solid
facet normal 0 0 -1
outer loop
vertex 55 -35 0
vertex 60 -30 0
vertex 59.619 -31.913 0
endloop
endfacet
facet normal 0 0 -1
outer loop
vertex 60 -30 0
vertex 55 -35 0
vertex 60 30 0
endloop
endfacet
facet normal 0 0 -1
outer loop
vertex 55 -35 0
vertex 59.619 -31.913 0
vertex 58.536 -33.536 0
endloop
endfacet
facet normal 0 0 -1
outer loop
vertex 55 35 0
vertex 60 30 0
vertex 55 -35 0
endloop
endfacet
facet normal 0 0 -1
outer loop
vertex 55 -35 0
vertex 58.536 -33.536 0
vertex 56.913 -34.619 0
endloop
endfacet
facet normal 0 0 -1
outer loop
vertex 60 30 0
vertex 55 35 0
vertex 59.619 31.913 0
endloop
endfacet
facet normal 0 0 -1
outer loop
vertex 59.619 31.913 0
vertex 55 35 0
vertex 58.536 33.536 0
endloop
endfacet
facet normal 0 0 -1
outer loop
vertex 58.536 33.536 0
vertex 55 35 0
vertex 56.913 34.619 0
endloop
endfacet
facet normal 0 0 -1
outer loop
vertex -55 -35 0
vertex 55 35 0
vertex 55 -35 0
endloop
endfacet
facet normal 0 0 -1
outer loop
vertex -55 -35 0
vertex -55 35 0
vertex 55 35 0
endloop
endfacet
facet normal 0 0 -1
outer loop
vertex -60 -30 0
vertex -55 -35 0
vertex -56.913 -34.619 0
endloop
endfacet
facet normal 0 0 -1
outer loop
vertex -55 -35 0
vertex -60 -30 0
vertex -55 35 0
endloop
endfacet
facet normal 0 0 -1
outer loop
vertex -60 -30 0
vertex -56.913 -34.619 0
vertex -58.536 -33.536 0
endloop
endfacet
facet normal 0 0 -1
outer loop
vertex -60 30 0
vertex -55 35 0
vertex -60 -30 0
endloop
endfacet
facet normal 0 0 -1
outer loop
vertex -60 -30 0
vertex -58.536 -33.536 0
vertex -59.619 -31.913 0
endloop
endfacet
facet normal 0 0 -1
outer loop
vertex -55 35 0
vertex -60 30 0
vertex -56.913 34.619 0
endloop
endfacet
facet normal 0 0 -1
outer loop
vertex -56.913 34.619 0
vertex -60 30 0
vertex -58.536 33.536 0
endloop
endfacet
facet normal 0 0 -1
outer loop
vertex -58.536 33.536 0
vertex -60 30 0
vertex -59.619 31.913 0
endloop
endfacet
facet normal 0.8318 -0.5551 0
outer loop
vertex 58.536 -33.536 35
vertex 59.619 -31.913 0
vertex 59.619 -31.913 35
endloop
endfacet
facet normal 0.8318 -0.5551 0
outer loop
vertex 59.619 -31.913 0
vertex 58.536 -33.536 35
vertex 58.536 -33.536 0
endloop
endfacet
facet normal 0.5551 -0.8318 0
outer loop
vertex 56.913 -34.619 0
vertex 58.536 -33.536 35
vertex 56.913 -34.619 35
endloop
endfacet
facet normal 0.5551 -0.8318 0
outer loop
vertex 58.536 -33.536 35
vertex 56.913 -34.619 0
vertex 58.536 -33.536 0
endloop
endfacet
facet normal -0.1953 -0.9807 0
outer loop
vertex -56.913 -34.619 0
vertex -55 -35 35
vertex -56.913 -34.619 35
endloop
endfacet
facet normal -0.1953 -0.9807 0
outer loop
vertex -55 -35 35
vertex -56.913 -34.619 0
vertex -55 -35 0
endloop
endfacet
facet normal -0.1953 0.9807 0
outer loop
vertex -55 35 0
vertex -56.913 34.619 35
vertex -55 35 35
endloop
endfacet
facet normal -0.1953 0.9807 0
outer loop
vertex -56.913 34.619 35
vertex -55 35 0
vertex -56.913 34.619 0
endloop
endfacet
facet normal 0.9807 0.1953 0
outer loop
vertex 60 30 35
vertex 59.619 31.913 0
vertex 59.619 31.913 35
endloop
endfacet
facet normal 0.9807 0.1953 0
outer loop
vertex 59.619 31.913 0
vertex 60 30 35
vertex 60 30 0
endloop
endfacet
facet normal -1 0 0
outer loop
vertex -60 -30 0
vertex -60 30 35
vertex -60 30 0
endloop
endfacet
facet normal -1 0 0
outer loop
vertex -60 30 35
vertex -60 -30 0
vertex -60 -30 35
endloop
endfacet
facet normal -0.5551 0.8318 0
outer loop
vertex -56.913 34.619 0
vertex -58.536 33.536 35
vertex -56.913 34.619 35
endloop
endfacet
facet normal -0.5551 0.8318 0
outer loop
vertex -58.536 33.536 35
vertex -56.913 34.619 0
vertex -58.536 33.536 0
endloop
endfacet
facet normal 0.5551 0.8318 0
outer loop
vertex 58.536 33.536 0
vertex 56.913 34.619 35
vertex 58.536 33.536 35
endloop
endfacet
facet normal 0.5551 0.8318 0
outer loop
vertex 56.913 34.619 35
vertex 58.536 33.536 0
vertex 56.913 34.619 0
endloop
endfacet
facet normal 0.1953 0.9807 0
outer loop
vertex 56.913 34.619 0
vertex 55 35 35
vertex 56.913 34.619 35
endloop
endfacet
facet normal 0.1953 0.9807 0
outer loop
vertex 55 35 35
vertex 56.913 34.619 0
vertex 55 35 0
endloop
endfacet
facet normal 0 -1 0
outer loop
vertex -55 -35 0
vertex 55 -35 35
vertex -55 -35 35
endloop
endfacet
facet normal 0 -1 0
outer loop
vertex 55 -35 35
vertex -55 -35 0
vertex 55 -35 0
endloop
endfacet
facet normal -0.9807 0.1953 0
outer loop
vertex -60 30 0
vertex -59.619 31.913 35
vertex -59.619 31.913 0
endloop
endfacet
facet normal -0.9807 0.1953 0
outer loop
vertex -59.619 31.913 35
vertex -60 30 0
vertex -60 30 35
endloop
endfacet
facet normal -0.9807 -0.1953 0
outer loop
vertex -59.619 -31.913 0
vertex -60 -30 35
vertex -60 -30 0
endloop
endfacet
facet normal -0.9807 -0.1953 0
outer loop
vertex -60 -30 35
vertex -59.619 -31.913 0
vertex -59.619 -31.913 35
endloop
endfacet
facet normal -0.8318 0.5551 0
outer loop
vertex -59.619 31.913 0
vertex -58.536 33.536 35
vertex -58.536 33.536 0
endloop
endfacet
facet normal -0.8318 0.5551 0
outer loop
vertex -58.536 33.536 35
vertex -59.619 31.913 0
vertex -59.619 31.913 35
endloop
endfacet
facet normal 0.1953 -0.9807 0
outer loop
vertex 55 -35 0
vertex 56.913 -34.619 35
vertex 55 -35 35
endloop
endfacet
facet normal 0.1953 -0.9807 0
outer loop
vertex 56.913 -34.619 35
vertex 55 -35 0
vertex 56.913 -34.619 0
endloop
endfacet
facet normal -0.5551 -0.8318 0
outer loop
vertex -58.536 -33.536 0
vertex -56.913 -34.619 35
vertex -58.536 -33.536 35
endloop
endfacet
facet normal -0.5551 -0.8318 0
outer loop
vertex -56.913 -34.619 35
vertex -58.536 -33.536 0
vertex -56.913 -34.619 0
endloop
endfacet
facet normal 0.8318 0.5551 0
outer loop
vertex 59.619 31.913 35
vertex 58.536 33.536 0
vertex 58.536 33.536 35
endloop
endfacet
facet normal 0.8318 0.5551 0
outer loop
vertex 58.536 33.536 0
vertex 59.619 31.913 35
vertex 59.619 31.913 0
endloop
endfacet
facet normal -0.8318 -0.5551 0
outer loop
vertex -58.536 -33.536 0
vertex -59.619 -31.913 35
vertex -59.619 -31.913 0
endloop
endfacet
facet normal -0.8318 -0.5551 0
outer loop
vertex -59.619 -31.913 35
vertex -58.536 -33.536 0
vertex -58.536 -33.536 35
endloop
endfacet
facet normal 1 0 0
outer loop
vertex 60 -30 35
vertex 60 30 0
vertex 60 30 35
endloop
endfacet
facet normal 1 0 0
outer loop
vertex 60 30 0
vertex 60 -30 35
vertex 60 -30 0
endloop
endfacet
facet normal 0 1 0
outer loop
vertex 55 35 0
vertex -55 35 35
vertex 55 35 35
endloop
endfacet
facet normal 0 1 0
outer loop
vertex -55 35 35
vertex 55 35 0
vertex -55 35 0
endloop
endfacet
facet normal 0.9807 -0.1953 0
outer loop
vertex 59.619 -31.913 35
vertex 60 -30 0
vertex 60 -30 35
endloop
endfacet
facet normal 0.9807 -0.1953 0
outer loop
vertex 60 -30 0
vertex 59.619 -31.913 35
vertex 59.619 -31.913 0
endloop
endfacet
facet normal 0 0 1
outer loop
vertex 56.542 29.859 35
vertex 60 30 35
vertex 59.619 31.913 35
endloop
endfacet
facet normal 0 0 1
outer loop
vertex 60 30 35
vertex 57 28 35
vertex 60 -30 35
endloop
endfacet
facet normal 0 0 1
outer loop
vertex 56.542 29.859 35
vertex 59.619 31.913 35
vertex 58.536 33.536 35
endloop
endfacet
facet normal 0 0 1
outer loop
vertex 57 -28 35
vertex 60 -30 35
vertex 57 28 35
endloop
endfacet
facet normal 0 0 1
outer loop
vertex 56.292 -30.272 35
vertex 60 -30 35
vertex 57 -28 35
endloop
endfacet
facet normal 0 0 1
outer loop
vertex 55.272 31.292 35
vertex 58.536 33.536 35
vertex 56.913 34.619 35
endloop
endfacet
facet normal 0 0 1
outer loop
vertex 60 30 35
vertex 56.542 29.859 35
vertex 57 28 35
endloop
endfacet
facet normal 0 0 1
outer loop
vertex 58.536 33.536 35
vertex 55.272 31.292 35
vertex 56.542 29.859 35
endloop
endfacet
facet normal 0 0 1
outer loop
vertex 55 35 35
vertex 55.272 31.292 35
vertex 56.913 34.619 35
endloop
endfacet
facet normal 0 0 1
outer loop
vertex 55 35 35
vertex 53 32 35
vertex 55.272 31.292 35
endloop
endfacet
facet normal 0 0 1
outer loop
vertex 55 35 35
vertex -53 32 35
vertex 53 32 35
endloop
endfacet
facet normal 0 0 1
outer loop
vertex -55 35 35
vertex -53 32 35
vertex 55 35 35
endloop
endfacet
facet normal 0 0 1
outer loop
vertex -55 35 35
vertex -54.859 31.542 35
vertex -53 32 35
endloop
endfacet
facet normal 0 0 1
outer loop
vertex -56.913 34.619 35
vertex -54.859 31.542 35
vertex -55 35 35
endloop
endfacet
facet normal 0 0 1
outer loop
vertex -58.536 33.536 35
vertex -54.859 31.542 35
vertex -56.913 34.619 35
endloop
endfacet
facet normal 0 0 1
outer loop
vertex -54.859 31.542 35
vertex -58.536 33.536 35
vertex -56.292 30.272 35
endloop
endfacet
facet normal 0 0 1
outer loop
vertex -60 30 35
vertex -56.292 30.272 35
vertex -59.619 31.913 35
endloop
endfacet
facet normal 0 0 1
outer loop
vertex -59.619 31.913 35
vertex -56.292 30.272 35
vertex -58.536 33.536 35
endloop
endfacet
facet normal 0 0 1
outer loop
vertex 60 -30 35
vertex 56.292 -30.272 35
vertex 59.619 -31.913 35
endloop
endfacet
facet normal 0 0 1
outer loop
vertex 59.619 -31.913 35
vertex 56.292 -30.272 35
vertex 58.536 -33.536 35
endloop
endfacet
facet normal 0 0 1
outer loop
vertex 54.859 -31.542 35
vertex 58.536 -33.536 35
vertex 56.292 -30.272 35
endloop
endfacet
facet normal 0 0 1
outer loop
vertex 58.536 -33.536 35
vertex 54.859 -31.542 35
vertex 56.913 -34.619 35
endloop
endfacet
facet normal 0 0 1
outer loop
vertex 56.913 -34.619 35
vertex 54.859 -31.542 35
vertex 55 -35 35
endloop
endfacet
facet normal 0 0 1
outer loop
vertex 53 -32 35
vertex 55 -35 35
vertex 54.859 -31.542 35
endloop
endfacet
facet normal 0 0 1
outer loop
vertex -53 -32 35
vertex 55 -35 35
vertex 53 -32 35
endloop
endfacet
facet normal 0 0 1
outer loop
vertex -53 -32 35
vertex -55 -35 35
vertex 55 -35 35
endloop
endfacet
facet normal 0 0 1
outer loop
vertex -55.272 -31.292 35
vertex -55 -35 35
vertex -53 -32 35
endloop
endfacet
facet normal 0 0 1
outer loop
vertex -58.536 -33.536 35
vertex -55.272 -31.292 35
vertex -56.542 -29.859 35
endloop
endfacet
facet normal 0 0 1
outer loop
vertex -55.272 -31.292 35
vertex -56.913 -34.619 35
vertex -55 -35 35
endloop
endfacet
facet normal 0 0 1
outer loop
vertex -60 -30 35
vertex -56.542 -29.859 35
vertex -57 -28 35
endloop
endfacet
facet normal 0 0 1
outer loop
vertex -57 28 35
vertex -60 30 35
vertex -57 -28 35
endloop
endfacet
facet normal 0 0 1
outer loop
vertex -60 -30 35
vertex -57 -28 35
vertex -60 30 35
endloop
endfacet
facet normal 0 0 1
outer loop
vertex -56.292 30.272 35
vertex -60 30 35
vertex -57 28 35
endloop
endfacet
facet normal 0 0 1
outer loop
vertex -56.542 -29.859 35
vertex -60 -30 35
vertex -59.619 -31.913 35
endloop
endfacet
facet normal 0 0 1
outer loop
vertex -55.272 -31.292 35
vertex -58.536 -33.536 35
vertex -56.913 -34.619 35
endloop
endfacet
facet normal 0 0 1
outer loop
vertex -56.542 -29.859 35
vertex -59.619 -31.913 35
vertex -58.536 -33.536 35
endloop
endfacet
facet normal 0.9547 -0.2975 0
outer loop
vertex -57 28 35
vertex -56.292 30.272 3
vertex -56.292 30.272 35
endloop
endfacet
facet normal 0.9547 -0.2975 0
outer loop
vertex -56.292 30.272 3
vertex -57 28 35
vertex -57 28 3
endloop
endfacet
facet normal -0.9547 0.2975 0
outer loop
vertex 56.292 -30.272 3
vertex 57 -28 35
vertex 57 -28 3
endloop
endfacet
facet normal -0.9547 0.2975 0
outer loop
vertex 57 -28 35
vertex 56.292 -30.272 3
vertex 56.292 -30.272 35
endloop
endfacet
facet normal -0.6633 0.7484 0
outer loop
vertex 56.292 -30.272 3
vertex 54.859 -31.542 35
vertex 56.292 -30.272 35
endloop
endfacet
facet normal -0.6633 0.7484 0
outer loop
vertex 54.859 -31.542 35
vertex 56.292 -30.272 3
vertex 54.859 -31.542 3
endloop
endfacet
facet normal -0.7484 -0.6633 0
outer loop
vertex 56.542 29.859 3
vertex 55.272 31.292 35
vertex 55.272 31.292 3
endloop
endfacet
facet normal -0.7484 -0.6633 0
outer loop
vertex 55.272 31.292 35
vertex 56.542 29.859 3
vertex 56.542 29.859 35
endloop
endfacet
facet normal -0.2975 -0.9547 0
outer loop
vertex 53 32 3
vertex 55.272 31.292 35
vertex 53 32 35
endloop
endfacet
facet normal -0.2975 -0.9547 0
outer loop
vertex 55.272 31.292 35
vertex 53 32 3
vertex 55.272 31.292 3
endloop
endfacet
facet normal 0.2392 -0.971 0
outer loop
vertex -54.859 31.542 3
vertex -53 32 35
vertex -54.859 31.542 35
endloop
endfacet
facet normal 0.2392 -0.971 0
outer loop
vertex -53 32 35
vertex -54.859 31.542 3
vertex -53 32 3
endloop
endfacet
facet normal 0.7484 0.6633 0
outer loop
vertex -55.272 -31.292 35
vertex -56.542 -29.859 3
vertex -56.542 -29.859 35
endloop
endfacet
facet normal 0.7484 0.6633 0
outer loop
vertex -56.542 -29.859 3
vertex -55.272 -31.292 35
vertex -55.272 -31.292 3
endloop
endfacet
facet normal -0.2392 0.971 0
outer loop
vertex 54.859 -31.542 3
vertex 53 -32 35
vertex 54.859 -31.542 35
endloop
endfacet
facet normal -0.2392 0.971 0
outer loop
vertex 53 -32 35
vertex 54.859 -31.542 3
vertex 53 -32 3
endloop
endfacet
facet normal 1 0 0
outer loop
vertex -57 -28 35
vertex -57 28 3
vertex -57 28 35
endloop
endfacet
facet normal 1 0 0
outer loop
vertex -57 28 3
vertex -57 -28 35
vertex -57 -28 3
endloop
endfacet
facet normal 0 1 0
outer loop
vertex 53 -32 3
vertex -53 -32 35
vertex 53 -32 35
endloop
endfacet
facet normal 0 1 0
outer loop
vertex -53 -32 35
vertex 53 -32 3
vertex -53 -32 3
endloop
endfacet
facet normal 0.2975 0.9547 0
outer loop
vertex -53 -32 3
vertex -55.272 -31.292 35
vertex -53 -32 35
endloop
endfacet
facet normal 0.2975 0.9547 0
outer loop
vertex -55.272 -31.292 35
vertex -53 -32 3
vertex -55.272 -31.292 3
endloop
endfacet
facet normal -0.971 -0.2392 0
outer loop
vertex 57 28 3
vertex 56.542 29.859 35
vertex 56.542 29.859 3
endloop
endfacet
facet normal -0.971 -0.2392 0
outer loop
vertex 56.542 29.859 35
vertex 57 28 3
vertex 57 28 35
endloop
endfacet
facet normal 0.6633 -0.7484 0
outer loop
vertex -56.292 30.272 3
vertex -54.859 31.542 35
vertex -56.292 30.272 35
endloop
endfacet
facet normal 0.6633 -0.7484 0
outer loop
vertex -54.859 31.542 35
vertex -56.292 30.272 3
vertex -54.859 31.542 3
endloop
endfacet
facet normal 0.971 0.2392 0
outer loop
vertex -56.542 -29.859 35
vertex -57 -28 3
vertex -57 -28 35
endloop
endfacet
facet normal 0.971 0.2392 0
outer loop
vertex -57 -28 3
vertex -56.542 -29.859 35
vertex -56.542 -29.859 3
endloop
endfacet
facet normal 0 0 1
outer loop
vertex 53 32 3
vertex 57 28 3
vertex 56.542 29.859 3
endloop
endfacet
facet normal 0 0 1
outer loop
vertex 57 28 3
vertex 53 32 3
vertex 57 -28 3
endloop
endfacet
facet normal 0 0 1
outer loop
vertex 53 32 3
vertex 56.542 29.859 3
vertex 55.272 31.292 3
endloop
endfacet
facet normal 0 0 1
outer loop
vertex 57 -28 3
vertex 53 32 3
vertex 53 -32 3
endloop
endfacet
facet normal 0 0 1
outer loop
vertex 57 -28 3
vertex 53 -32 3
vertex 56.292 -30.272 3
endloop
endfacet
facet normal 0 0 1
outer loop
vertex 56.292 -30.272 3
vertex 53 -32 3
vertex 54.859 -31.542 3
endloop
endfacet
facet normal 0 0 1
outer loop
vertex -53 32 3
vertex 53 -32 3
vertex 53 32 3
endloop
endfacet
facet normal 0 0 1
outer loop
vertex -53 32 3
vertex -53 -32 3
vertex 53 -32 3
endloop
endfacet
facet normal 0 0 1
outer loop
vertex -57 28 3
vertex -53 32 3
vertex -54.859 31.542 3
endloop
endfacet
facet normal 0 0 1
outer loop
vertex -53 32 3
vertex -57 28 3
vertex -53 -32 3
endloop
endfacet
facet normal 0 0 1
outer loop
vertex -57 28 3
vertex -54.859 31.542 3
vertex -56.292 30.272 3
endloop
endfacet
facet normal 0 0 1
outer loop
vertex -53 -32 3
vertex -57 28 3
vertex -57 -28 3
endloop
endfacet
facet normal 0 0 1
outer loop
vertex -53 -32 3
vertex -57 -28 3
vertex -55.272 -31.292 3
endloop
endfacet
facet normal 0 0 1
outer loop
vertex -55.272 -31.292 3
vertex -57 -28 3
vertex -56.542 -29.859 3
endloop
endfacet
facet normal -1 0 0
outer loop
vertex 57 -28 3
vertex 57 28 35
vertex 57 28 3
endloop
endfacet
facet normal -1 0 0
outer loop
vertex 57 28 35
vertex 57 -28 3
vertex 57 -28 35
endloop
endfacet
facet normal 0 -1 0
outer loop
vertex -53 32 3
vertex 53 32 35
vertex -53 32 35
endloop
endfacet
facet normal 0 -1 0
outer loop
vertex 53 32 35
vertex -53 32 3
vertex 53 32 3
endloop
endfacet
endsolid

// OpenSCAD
// Parametric Electronics Enclosure
// Designed for AI-training CAD benchmark tasks

case_length = 120;
case_width = 70;
case_height = 35;
wall_thickness = 3;
corner_radius = 5;

lid_thickness = 3;
screw_diameter = 3;
screw_offset = 10;

module rounded_box(length, width, height, radius) {
    linear_extrude(height = height)
        offset(r = radius)
            offset(delta = -radius)
                square([length, width], center = true);
}

module outer_shell() {
    rounded_box(case_length, case_width, case_height, corner_radius);
}

module inner_cutout() {
    translate([0, 0, wall_thickness])
        rounded_box(
            case_length - 2 * wall_thickness,
            case_width - 2 * wall_thickness,
            case_height,
            corner_radius - 1
        );
}

module screw_posts() {
    for (x = [-case_length / 2 + screw_offset, case_length / 2 - screw_offset]) {
        for (y = [-case_width / 2 + screw_offset, case_width / 2 - screw_offset]) {
            translate([x, y, 0])
                difference() {
                    cylinder(h = case_height - lid_thickness, d = 8, $fn = 32);
                    translate([0, 0, -1])
                        cylinder(h = case_height + 2, d = screw_diameter, $fn = 32);
                }
        }
    }
}

difference() {
    union() {
        outer_shell();
        screw_posts();
    }

    inner_cutout();
}
